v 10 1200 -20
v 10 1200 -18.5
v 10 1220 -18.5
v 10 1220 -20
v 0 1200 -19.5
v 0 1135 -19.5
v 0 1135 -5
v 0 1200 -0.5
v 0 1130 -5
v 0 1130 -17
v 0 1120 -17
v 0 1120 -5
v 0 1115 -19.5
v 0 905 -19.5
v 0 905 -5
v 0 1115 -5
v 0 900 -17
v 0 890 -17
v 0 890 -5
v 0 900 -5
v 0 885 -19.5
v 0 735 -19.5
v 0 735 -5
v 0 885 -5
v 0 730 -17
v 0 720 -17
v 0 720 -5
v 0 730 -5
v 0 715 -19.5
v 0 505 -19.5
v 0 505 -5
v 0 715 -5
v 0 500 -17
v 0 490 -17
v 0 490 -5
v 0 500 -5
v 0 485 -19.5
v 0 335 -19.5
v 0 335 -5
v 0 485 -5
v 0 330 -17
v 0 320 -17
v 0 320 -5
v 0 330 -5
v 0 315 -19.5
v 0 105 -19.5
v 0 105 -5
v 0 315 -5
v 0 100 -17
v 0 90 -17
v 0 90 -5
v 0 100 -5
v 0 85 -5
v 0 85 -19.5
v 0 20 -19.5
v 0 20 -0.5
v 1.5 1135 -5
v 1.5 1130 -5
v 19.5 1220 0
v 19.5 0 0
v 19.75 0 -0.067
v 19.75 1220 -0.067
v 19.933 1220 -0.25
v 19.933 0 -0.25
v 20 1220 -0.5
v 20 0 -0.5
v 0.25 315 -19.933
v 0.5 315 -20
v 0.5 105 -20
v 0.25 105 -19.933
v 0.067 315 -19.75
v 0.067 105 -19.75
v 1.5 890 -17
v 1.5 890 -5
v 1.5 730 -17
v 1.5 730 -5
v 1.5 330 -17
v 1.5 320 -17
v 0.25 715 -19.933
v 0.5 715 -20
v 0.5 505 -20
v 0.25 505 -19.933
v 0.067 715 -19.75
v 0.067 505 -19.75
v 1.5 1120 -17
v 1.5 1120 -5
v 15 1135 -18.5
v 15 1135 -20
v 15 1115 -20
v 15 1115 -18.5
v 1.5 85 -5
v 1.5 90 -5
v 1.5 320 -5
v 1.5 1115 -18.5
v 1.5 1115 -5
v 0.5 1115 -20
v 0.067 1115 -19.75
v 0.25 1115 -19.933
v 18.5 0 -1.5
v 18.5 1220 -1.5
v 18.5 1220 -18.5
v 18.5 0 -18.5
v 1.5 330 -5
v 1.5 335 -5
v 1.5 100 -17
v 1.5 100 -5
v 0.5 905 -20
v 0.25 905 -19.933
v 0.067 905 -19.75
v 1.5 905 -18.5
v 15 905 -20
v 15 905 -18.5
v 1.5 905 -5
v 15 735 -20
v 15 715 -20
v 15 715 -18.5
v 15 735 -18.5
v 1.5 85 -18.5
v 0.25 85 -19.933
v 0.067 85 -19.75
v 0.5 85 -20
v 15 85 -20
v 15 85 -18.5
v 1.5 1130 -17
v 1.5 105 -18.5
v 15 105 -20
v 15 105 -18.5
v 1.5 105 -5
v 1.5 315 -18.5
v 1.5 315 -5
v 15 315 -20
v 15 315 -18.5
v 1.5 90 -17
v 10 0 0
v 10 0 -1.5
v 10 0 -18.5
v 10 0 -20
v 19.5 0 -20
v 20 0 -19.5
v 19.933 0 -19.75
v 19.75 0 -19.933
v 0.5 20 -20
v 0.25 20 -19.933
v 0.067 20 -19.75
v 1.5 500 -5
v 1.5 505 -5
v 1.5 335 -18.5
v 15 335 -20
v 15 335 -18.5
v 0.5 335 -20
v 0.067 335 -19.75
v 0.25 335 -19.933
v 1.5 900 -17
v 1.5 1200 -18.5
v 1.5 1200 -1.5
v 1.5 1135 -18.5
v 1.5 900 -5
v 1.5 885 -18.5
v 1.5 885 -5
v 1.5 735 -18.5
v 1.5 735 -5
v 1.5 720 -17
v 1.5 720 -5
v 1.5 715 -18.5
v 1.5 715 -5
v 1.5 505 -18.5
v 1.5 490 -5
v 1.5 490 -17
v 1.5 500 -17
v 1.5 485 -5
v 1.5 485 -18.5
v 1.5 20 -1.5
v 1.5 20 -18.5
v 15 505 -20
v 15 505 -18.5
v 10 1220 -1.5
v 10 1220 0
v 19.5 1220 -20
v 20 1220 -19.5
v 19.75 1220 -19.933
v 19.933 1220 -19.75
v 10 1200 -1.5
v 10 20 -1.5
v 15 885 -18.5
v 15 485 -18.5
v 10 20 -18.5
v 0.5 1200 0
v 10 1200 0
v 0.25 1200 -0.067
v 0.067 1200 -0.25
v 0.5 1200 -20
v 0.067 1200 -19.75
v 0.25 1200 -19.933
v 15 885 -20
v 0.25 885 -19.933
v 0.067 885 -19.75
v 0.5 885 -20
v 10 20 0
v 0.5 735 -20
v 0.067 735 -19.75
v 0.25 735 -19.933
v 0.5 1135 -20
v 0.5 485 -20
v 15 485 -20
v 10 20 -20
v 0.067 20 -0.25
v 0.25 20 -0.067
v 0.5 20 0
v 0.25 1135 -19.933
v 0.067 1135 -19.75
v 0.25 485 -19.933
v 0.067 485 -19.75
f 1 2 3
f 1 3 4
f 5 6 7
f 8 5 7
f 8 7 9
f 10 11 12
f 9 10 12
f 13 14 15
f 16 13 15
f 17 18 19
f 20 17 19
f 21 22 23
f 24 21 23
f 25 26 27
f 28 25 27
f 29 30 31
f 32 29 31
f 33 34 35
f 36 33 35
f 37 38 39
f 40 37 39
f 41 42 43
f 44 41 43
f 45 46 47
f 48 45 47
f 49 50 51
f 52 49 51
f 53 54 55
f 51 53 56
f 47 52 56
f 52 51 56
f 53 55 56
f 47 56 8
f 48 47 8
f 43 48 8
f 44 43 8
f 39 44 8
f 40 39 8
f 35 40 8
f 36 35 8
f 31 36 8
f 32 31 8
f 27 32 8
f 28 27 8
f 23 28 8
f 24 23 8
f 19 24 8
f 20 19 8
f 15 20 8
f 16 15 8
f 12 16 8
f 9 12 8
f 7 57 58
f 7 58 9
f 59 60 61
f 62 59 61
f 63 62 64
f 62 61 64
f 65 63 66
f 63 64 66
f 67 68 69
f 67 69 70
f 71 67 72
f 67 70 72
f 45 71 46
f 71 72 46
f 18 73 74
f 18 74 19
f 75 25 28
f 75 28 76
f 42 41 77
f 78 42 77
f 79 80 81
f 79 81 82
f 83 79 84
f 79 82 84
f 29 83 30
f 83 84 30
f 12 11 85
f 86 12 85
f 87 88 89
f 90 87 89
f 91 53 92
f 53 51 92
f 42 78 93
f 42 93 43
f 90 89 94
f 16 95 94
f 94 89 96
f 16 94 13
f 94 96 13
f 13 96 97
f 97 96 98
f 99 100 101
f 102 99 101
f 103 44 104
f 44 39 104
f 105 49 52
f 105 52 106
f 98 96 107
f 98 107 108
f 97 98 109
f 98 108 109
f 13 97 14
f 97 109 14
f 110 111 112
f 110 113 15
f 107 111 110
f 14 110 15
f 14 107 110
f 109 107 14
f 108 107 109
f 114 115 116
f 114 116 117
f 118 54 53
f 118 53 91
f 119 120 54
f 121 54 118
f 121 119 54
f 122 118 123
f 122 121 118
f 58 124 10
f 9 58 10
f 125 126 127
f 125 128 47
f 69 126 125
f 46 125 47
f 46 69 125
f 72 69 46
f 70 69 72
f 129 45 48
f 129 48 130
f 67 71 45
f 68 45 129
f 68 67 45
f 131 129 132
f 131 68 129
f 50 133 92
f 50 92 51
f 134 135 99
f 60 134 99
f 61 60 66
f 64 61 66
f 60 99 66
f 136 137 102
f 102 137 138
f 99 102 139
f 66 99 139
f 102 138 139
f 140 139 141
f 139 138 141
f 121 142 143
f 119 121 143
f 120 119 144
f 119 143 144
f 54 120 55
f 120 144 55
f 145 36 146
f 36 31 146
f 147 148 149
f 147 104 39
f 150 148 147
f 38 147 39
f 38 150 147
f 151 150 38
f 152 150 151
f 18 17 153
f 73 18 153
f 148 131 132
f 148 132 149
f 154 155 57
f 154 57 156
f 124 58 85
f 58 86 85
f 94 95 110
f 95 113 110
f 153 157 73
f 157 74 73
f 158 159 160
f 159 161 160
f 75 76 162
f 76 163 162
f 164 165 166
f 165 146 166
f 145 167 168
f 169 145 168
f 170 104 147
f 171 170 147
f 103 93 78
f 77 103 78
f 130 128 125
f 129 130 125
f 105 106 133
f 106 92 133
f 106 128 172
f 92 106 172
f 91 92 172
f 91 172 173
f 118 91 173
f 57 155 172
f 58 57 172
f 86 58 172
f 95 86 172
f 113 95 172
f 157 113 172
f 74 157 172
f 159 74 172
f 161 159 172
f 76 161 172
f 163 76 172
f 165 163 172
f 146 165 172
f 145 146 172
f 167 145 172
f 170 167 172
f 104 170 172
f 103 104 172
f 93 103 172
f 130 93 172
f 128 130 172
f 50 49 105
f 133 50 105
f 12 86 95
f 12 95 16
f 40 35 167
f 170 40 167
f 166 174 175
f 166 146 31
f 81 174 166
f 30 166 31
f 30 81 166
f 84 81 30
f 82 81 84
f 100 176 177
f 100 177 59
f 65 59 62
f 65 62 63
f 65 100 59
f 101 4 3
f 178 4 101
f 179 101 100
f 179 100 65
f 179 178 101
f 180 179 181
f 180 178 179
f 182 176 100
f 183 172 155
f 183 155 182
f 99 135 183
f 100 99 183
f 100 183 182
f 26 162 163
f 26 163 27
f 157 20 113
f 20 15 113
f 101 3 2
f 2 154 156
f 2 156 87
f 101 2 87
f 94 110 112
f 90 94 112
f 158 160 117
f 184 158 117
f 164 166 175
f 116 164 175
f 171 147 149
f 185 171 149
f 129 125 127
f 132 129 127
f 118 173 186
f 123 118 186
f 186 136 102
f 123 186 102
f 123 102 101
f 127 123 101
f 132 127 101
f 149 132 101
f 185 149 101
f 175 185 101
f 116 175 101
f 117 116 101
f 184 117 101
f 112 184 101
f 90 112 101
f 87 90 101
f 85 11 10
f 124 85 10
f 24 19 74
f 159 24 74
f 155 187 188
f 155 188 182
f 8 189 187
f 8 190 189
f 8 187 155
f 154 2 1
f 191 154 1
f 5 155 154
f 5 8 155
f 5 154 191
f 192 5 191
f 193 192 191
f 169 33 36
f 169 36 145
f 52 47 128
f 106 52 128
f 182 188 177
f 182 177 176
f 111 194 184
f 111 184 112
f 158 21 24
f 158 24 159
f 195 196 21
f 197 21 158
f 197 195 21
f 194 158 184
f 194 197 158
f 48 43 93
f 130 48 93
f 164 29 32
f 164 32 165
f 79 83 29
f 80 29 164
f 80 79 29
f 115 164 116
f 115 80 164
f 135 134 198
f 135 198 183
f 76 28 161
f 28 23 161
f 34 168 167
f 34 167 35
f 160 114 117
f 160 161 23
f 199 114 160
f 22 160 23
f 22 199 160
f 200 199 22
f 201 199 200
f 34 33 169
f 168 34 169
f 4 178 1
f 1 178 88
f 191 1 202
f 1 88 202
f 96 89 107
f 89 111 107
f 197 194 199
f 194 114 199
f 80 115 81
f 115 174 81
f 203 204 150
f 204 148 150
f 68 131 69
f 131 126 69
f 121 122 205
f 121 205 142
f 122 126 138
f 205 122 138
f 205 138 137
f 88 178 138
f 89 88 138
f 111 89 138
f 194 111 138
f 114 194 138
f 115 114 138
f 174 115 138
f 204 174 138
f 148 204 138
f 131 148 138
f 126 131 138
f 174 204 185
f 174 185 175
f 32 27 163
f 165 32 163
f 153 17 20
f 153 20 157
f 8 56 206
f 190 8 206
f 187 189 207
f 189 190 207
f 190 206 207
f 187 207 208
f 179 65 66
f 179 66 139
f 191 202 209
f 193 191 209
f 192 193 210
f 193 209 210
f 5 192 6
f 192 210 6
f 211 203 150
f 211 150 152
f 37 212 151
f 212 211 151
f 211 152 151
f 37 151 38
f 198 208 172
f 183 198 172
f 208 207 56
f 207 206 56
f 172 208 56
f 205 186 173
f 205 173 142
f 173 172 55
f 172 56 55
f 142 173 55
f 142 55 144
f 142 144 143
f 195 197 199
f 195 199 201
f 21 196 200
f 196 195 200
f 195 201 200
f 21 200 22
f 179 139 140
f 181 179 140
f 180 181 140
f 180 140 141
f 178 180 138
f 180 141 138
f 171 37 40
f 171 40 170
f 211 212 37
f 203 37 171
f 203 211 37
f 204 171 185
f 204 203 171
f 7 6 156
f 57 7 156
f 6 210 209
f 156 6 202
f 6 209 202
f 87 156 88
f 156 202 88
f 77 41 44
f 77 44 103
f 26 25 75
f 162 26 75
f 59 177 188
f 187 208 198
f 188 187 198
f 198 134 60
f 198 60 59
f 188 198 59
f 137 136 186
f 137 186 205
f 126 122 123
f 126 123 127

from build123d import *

# Parameters (mm, degrees)
SKETCH1_W                   = 17
SKETCH1_H                   = 17
BOSS_EXTRUDE1_DEPTH         = 1220
CUT_EXTRUDE1_START          = -20
SKETCH2_W                   = 20
SKETCH2_H                   = 20
CUT_EXTRUDE1_DEPTH          = 10
CUT_EXTRUDE2_DEPTH          = 15
SKETCH4_W                   = 3
SKETCH4_H                   = 10
CUT_EXTRUDE3_DEPTH          = 10
SKETCH_PATTERN1_START       = -20
SKETCH_PATTERN1_DEPTH       = 15
SKETCH_PATTERN1_2_OUTLINE_W = 1.5
SKETCH_PATTERN1_2_OUTLINE_H = 10
SKETCH_PATTERN1_2_DEPTH     = 3


# Read off the part's stored shape, not the designer's step: Sketch-Pattern1
with BuildPart() as part:
    # Sketch1 → Boss-Extrude1 (new body)
    with BuildSketch(Plane(origin=(0, 0, 0), x_dir=(1, 0, 0), z_dir=(0, 1, 0))):
        with BuildLine():
            Line((0.5, 0), (19.5, 0))
            ThreePointArc((19.5, 0), (19.853553391, 0.146446609), (20, 0.5))
            Line((20, 0.5), (20, 19.5))
            ThreePointArc((20, 19.5), (19.853553391, 19.853553391), (19.5, 20))
            Line((19.5, 20), (0.5, 20))
            ThreePointArc((0.5, 20), (0.146446609, 19.853553391), (0, 19.5))
            Line((0, 19.5), (0, 0.5))
            ThreePointArc((0, 0.5), (0.146446609, 0.146446609), (0.5, 0))
        make_face()
        with Locations((10, 10)):
            Rectangle(SKETCH1_W, SKETCH1_H, mode=Mode.SUBTRACT)
    extrude(amount=BOSS_EXTRUDE1_DEPTH)

    # Sketch2 → Cut-Extrude1 (cut)
    with BuildSketch(Plane(origin=(20, 0, 0), x_dir=(0, 0, -1), z_dir=(1, 0, 0)).offset(CUT_EXTRUDE1_START)):
        with Locations((10, 1210)):
            Rectangle(SKETCH2_W, SKETCH2_H)
        with Locations((10, 10)):
            Rectangle(SKETCH2_W, SKETCH2_H)
    extrude(amount=CUT_EXTRUDE1_DEPTH, mode=Mode.SUBTRACT)

    # Sketch3 → Cut-Extrude2 (cut)
    with BuildSketch(Plane(origin=(0, 0, -20), x_dir=(-1, 0, 0), z_dir=(0, 0, -1))):
        Polygon((-15, 1115), (0, 1115), (0, 1120), (-9, 1120), (-9, 1130), (0, 1130), (0, 1135), (-15, 1135), align=None)
    extrude(amount=-CUT_EXTRUDE2_DEPTH, mode=Mode.SUBTRACT)

    # Sketch4 → Cut-Extrude3 (cut)
    with BuildSketch(Plane.ZY):
        with Locations((-18.5, 1125)):
            Rectangle(SKETCH4_W, SKETCH4_H)
    extrude(amount=-CUT_EXTRUDE3_DEPTH, mode=Mode.SUBTRACT)

    # Sketch-Pattern1 outline → Sketch-Pattern1 (cut)
    with BuildSketch(Plane.XY.offset(SKETCH_PATTERN1_START)):
        Polygon((15, 85), (15, 105), (0, 105), (0, 100), (1.5, 100), (1.5, 90), (0, 90), (0, 85), align=None)
        Polygon((1.5, 330), (1.5, 320), (0, 320), (0, 315), (15, 315), (15, 335), (0, 335), (0, 330), align=None)
        Polygon((1.5, 500), (1.5, 490), (0, 490), (0, 485), (15, 485), (15, 505), (0, 505), (0, 500), align=None)
        Polygon((1.5, 730), (1.5, 720), (0, 720), (0, 715), (15, 715), (15, 735), (0, 735), (0, 730), align=None)
        Polygon((1.5, 900), (1.5, 890), (0, 890), (0, 885), (15, 885), (15, 905), (0, 905), (0, 900), align=None)
    extrude(amount=SKETCH_PATTERN1_DEPTH, mode=Mode.SUBTRACT)

    # Sketch-Pattern1 2 outline → Sketch-Pattern1 2 (cut)
    with BuildSketch(Plane.XY.offset(SKETCH_PATTERN1_START)):
        with Locations((0.75, 95)):
            Rectangle(SKETCH_PATTERN1_2_OUTLINE_W, SKETCH_PATTERN1_2_OUTLINE_H)
        with Locations((0.75, 325)):
            Rectangle(SKETCH_PATTERN1_2_OUTLINE_W, SKETCH_PATTERN1_2_OUTLINE_H)
        with Locations((0.75, 495)):
            Rectangle(SKETCH_PATTERN1_2_OUTLINE_W, SKETCH_PATTERN1_2_OUTLINE_H)
        with Locations((0.75, 725)):
            Rectangle(SKETCH_PATTERN1_2_OUTLINE_W, SKETCH_PATTERN1_2_OUTLINE_H)
        with Locations((0.75, 895)):
            Rectangle(SKETCH_PATTERN1_2_OUTLINE_W, SKETCH_PATTERN1_2_OUTLINE_H)
    extrude(amount=SKETCH_PATTERN1_2_DEPTH, mode=Mode.SUBTRACT)


solid = part.part
